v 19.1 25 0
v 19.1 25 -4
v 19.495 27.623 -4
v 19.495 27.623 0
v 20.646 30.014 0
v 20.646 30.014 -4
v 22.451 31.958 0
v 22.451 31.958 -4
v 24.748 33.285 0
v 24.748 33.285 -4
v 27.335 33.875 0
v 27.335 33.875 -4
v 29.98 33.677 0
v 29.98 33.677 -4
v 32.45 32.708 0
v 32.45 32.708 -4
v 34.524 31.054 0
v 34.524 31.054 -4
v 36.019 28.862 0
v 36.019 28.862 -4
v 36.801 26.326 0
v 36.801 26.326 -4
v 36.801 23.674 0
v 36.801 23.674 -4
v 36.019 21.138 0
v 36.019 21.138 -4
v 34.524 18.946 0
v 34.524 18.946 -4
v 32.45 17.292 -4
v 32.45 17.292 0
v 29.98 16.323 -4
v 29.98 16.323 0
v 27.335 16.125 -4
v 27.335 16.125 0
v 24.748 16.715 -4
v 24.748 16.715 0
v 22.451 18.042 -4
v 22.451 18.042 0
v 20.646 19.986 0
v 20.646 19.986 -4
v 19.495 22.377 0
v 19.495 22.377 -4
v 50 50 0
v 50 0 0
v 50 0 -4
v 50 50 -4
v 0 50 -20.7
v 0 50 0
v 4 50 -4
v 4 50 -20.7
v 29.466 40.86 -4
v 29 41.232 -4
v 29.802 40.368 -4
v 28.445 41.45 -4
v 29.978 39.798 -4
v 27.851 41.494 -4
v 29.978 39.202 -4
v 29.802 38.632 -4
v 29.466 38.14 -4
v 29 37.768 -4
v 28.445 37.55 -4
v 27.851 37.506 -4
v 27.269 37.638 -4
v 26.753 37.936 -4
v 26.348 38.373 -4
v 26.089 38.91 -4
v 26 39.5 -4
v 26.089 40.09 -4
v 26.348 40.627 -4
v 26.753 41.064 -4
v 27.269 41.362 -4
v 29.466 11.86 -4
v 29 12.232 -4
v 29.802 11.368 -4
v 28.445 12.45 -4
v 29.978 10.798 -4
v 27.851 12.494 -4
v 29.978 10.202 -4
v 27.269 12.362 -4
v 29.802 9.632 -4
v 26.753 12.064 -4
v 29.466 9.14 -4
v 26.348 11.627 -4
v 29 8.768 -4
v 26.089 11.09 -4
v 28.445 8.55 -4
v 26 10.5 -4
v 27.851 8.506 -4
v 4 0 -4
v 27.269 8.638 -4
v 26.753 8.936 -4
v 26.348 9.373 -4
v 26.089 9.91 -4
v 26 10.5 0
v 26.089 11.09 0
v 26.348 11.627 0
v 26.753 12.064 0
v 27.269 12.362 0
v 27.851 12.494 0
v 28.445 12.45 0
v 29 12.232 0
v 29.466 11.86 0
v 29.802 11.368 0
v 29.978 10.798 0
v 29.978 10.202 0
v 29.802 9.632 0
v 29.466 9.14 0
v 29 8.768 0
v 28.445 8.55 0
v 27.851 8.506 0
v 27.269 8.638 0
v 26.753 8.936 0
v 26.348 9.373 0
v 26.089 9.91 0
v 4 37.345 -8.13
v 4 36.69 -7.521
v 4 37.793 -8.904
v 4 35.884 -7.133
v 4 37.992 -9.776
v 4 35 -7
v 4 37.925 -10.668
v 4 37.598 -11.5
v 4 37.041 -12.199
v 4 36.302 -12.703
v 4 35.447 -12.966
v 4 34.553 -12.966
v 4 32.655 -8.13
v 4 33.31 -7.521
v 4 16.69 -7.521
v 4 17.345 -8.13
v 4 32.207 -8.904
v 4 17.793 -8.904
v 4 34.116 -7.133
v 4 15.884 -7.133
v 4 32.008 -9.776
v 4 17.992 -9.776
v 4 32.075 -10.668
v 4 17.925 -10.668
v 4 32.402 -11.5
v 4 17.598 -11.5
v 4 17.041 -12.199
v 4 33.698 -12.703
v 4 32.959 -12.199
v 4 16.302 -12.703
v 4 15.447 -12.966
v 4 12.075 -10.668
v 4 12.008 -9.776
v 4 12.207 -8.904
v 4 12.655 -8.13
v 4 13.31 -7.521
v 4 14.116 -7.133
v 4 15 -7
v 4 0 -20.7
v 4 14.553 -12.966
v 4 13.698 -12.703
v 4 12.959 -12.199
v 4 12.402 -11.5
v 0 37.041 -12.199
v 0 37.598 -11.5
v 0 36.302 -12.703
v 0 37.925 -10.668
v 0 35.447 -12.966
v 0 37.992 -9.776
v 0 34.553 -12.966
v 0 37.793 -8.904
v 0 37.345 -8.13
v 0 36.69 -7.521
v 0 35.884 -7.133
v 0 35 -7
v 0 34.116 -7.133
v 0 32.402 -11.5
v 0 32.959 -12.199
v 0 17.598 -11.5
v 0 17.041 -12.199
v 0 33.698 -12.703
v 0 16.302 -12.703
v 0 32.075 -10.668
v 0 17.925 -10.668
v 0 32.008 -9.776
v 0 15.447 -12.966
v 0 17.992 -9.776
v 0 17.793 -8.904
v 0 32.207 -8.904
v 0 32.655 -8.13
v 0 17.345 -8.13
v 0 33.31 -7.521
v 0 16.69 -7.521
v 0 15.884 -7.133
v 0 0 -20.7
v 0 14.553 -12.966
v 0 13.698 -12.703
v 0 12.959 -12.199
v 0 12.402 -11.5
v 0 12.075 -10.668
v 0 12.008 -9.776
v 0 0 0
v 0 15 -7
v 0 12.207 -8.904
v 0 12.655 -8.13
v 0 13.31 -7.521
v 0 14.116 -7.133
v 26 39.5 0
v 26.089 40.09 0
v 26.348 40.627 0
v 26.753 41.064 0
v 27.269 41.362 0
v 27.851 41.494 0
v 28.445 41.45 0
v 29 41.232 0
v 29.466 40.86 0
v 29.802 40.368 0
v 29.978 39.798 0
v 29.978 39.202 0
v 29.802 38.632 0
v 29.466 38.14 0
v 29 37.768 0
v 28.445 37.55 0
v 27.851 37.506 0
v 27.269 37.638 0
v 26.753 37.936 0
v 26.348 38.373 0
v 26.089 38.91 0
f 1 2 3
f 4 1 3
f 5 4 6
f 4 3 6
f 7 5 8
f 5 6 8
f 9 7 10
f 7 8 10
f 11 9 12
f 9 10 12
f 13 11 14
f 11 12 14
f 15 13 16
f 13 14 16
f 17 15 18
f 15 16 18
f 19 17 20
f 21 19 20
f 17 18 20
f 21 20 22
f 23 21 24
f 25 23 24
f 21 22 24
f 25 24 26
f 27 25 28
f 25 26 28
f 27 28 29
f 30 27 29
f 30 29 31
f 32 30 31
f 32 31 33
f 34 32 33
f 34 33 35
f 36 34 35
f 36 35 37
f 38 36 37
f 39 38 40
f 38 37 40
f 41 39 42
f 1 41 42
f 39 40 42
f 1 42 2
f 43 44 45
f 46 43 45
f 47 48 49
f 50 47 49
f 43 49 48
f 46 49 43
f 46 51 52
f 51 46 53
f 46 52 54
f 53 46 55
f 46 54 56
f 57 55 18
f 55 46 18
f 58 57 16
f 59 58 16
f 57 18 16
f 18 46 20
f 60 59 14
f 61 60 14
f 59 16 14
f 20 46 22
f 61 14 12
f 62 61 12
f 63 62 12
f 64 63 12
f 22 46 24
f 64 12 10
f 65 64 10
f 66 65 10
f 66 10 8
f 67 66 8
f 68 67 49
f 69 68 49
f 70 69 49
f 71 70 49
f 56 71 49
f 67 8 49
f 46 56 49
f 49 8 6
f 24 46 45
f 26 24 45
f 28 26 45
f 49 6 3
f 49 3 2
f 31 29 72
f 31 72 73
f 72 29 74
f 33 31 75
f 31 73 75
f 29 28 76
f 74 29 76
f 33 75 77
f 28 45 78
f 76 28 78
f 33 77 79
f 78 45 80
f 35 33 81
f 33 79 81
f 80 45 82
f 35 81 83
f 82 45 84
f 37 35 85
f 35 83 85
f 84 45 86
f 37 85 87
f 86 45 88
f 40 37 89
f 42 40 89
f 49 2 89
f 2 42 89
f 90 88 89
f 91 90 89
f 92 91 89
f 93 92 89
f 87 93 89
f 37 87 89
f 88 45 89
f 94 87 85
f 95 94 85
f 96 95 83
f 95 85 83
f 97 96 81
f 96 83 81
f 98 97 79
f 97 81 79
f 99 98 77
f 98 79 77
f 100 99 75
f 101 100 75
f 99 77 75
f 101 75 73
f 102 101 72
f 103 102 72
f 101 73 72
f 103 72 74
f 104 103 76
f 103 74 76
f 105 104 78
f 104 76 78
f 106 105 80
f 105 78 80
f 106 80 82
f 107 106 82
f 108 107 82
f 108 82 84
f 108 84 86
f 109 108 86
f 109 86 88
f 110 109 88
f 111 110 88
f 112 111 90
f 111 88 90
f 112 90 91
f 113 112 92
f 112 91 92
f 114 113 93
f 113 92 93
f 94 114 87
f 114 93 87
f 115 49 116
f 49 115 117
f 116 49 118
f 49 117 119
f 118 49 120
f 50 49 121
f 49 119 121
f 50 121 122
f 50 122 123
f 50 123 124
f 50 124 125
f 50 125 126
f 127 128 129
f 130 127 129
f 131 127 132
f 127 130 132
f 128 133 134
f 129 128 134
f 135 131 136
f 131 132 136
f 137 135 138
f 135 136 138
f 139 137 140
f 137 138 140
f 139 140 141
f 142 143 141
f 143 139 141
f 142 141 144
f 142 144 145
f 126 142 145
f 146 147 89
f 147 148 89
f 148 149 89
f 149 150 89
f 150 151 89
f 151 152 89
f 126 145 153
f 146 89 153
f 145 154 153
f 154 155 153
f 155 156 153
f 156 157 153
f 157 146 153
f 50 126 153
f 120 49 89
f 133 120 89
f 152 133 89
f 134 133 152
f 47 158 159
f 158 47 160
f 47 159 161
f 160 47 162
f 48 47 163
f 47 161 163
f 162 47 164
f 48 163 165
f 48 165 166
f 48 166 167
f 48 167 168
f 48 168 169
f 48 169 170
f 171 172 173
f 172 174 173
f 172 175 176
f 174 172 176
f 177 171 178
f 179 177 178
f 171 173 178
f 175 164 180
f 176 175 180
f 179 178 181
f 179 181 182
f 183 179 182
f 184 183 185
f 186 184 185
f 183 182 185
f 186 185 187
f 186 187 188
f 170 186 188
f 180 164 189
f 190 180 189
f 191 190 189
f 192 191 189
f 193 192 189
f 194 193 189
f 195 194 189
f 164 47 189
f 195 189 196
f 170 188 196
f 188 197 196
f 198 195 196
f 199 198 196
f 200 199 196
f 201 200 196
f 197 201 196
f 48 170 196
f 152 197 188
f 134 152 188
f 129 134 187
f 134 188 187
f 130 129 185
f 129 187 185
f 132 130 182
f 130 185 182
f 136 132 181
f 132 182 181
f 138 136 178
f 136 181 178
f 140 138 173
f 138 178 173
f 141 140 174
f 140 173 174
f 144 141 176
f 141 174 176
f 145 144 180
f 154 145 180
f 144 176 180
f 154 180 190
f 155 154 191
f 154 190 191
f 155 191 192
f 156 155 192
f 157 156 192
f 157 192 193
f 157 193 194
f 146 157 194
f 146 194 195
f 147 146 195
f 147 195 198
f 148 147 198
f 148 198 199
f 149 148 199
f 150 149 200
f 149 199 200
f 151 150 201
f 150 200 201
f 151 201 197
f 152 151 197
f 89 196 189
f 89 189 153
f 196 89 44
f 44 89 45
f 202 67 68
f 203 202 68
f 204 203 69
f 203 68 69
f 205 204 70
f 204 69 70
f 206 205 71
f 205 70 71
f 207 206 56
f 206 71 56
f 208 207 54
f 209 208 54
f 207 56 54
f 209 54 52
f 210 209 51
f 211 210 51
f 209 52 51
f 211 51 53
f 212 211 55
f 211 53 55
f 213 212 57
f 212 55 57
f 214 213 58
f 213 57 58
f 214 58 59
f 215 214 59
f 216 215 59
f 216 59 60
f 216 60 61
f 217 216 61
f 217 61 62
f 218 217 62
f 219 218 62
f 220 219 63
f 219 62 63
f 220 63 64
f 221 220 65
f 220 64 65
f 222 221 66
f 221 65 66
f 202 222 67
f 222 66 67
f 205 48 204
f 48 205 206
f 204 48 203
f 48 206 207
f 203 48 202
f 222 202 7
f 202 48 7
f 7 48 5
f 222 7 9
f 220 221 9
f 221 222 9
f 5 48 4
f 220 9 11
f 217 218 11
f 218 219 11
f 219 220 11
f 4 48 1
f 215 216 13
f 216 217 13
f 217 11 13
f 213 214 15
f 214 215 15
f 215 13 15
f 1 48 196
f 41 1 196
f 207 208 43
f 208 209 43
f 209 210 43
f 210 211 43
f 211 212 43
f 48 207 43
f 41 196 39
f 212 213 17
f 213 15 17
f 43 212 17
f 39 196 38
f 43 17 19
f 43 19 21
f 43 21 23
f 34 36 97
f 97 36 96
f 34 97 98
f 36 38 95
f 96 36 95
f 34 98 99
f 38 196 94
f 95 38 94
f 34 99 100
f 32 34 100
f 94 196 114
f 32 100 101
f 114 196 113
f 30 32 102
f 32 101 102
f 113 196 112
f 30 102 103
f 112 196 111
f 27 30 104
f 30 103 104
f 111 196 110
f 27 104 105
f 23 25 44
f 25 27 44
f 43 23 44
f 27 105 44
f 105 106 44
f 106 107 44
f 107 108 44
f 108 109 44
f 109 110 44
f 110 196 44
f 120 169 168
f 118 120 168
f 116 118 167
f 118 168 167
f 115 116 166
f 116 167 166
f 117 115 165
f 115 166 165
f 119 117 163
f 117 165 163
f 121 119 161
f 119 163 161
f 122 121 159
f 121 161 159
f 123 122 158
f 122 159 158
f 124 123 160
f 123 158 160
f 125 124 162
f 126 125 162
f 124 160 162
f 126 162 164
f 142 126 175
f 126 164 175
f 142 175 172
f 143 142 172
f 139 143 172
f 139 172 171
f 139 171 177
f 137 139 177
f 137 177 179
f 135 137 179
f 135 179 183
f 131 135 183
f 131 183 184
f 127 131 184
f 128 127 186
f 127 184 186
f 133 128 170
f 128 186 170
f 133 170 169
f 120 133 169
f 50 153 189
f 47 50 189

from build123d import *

# Parameters (mm, degrees)
EXTRUDE_1_DEPTH     = 50
SKETCH_2_R          = 3
CUT_EXTRUDE_1_DEPTH = 4
SKETCH_3_R          = 8.9
SKETCH_3_R_2        = 2
CUT_EXTRUDE_2_DEPTH = 4


with BuildPart() as part:
    # Эскиз1 → Бобышка-Вытянуть1 (new body)
    with BuildSketch(Plane(origin=(0, 0, 0), x_dir=(1, 0, 0), z_dir=(0, 1, 0))):
        Polygon((0, 0), (50, 0), (50, 4), (4, 4), (4, 20.7), (0, 20.7), (0, 4), align=None)
    extrude(amount=EXTRUDE_1_DEPTH)

    # Эскиз2 → Вырез-Вытянуть1 (cut)
    with BuildSketch(Plane.ZY):
        with Locations((-10, 35)):
            Circle(SKETCH_2_R)
        with Locations((-10, 15)):
            Circle(SKETCH_2_R)
    extrude(amount=-CUT_EXTRUDE_1_DEPTH, mode=Mode.SUBTRACT)

    # Эскиз3 → Вырез-Вытянуть2 (cut)
    with BuildSketch(Plane(origin=(0, 0, -4), x_dir=(-1, 0, 0), z_dir=(0, 0, -1))):
        with Locations((-28, 25)):
            Circle(SKETCH_3_R)
        with Locations((-28, 39.5)):
            Circle(SKETCH_3_R_2)
        with Locations((-28, 10.5)):
            Circle(SKETCH_3_R_2)
    extrude(amount=-CUT_EXTRUDE_2_DEPTH, mode=Mode.SUBTRACT)


solid = part.part
